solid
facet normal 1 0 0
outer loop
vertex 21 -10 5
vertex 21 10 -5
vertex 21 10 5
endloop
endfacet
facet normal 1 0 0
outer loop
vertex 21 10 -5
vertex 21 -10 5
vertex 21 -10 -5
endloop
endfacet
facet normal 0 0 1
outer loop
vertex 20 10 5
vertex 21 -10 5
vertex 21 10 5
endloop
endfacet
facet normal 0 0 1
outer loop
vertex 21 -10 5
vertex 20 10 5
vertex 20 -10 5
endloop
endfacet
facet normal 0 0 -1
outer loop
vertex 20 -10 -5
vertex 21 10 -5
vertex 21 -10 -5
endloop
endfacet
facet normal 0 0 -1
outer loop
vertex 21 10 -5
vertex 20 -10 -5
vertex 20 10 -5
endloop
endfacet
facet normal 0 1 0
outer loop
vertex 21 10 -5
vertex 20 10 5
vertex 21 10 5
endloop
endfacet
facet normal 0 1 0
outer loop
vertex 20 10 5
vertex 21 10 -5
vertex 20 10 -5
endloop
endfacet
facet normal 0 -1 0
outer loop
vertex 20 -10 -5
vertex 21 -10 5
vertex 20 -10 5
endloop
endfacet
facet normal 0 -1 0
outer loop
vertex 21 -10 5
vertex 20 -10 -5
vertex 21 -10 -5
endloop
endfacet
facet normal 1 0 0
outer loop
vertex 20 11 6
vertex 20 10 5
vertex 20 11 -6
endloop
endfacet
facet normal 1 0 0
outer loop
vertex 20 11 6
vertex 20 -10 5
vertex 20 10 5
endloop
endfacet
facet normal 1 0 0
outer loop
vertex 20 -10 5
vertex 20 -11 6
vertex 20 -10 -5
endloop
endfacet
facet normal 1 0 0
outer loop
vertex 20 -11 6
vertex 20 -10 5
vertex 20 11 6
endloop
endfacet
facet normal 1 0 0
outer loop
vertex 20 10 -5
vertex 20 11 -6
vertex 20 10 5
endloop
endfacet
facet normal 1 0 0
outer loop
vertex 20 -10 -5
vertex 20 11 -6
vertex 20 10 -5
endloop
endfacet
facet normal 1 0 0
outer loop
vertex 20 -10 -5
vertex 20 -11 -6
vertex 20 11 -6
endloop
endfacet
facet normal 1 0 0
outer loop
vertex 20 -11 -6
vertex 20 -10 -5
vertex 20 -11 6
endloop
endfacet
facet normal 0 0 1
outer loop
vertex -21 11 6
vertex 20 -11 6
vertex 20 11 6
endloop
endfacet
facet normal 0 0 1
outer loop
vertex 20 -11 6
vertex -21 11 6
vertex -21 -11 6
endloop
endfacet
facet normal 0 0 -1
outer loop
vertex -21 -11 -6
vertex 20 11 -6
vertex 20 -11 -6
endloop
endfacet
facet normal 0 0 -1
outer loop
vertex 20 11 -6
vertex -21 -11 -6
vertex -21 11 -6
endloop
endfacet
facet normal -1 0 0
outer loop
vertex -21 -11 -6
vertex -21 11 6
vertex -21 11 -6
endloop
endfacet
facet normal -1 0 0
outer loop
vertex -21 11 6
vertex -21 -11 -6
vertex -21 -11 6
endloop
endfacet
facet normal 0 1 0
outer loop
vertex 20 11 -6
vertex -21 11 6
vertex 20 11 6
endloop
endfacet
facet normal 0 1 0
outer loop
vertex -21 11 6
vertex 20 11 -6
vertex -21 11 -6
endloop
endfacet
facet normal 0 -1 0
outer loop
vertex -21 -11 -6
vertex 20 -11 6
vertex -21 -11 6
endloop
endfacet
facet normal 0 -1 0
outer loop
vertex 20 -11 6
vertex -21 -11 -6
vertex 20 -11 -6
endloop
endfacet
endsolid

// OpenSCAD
// Unit of length: Unit.MM
union()
{
   color(c = [1.0, 0.0, 0.0, 1.0])
   {
      translate(v = [0.5, 0.0, 0.0])
      {
         cube(size = [41.0, 20.0, 10.0], center = true);
      }
   }
   translate(v = [-0.5, 0.0, 0.0])
   {
      cube(size = [41.0, 22.0, 12.0], center = true);
   }
}
